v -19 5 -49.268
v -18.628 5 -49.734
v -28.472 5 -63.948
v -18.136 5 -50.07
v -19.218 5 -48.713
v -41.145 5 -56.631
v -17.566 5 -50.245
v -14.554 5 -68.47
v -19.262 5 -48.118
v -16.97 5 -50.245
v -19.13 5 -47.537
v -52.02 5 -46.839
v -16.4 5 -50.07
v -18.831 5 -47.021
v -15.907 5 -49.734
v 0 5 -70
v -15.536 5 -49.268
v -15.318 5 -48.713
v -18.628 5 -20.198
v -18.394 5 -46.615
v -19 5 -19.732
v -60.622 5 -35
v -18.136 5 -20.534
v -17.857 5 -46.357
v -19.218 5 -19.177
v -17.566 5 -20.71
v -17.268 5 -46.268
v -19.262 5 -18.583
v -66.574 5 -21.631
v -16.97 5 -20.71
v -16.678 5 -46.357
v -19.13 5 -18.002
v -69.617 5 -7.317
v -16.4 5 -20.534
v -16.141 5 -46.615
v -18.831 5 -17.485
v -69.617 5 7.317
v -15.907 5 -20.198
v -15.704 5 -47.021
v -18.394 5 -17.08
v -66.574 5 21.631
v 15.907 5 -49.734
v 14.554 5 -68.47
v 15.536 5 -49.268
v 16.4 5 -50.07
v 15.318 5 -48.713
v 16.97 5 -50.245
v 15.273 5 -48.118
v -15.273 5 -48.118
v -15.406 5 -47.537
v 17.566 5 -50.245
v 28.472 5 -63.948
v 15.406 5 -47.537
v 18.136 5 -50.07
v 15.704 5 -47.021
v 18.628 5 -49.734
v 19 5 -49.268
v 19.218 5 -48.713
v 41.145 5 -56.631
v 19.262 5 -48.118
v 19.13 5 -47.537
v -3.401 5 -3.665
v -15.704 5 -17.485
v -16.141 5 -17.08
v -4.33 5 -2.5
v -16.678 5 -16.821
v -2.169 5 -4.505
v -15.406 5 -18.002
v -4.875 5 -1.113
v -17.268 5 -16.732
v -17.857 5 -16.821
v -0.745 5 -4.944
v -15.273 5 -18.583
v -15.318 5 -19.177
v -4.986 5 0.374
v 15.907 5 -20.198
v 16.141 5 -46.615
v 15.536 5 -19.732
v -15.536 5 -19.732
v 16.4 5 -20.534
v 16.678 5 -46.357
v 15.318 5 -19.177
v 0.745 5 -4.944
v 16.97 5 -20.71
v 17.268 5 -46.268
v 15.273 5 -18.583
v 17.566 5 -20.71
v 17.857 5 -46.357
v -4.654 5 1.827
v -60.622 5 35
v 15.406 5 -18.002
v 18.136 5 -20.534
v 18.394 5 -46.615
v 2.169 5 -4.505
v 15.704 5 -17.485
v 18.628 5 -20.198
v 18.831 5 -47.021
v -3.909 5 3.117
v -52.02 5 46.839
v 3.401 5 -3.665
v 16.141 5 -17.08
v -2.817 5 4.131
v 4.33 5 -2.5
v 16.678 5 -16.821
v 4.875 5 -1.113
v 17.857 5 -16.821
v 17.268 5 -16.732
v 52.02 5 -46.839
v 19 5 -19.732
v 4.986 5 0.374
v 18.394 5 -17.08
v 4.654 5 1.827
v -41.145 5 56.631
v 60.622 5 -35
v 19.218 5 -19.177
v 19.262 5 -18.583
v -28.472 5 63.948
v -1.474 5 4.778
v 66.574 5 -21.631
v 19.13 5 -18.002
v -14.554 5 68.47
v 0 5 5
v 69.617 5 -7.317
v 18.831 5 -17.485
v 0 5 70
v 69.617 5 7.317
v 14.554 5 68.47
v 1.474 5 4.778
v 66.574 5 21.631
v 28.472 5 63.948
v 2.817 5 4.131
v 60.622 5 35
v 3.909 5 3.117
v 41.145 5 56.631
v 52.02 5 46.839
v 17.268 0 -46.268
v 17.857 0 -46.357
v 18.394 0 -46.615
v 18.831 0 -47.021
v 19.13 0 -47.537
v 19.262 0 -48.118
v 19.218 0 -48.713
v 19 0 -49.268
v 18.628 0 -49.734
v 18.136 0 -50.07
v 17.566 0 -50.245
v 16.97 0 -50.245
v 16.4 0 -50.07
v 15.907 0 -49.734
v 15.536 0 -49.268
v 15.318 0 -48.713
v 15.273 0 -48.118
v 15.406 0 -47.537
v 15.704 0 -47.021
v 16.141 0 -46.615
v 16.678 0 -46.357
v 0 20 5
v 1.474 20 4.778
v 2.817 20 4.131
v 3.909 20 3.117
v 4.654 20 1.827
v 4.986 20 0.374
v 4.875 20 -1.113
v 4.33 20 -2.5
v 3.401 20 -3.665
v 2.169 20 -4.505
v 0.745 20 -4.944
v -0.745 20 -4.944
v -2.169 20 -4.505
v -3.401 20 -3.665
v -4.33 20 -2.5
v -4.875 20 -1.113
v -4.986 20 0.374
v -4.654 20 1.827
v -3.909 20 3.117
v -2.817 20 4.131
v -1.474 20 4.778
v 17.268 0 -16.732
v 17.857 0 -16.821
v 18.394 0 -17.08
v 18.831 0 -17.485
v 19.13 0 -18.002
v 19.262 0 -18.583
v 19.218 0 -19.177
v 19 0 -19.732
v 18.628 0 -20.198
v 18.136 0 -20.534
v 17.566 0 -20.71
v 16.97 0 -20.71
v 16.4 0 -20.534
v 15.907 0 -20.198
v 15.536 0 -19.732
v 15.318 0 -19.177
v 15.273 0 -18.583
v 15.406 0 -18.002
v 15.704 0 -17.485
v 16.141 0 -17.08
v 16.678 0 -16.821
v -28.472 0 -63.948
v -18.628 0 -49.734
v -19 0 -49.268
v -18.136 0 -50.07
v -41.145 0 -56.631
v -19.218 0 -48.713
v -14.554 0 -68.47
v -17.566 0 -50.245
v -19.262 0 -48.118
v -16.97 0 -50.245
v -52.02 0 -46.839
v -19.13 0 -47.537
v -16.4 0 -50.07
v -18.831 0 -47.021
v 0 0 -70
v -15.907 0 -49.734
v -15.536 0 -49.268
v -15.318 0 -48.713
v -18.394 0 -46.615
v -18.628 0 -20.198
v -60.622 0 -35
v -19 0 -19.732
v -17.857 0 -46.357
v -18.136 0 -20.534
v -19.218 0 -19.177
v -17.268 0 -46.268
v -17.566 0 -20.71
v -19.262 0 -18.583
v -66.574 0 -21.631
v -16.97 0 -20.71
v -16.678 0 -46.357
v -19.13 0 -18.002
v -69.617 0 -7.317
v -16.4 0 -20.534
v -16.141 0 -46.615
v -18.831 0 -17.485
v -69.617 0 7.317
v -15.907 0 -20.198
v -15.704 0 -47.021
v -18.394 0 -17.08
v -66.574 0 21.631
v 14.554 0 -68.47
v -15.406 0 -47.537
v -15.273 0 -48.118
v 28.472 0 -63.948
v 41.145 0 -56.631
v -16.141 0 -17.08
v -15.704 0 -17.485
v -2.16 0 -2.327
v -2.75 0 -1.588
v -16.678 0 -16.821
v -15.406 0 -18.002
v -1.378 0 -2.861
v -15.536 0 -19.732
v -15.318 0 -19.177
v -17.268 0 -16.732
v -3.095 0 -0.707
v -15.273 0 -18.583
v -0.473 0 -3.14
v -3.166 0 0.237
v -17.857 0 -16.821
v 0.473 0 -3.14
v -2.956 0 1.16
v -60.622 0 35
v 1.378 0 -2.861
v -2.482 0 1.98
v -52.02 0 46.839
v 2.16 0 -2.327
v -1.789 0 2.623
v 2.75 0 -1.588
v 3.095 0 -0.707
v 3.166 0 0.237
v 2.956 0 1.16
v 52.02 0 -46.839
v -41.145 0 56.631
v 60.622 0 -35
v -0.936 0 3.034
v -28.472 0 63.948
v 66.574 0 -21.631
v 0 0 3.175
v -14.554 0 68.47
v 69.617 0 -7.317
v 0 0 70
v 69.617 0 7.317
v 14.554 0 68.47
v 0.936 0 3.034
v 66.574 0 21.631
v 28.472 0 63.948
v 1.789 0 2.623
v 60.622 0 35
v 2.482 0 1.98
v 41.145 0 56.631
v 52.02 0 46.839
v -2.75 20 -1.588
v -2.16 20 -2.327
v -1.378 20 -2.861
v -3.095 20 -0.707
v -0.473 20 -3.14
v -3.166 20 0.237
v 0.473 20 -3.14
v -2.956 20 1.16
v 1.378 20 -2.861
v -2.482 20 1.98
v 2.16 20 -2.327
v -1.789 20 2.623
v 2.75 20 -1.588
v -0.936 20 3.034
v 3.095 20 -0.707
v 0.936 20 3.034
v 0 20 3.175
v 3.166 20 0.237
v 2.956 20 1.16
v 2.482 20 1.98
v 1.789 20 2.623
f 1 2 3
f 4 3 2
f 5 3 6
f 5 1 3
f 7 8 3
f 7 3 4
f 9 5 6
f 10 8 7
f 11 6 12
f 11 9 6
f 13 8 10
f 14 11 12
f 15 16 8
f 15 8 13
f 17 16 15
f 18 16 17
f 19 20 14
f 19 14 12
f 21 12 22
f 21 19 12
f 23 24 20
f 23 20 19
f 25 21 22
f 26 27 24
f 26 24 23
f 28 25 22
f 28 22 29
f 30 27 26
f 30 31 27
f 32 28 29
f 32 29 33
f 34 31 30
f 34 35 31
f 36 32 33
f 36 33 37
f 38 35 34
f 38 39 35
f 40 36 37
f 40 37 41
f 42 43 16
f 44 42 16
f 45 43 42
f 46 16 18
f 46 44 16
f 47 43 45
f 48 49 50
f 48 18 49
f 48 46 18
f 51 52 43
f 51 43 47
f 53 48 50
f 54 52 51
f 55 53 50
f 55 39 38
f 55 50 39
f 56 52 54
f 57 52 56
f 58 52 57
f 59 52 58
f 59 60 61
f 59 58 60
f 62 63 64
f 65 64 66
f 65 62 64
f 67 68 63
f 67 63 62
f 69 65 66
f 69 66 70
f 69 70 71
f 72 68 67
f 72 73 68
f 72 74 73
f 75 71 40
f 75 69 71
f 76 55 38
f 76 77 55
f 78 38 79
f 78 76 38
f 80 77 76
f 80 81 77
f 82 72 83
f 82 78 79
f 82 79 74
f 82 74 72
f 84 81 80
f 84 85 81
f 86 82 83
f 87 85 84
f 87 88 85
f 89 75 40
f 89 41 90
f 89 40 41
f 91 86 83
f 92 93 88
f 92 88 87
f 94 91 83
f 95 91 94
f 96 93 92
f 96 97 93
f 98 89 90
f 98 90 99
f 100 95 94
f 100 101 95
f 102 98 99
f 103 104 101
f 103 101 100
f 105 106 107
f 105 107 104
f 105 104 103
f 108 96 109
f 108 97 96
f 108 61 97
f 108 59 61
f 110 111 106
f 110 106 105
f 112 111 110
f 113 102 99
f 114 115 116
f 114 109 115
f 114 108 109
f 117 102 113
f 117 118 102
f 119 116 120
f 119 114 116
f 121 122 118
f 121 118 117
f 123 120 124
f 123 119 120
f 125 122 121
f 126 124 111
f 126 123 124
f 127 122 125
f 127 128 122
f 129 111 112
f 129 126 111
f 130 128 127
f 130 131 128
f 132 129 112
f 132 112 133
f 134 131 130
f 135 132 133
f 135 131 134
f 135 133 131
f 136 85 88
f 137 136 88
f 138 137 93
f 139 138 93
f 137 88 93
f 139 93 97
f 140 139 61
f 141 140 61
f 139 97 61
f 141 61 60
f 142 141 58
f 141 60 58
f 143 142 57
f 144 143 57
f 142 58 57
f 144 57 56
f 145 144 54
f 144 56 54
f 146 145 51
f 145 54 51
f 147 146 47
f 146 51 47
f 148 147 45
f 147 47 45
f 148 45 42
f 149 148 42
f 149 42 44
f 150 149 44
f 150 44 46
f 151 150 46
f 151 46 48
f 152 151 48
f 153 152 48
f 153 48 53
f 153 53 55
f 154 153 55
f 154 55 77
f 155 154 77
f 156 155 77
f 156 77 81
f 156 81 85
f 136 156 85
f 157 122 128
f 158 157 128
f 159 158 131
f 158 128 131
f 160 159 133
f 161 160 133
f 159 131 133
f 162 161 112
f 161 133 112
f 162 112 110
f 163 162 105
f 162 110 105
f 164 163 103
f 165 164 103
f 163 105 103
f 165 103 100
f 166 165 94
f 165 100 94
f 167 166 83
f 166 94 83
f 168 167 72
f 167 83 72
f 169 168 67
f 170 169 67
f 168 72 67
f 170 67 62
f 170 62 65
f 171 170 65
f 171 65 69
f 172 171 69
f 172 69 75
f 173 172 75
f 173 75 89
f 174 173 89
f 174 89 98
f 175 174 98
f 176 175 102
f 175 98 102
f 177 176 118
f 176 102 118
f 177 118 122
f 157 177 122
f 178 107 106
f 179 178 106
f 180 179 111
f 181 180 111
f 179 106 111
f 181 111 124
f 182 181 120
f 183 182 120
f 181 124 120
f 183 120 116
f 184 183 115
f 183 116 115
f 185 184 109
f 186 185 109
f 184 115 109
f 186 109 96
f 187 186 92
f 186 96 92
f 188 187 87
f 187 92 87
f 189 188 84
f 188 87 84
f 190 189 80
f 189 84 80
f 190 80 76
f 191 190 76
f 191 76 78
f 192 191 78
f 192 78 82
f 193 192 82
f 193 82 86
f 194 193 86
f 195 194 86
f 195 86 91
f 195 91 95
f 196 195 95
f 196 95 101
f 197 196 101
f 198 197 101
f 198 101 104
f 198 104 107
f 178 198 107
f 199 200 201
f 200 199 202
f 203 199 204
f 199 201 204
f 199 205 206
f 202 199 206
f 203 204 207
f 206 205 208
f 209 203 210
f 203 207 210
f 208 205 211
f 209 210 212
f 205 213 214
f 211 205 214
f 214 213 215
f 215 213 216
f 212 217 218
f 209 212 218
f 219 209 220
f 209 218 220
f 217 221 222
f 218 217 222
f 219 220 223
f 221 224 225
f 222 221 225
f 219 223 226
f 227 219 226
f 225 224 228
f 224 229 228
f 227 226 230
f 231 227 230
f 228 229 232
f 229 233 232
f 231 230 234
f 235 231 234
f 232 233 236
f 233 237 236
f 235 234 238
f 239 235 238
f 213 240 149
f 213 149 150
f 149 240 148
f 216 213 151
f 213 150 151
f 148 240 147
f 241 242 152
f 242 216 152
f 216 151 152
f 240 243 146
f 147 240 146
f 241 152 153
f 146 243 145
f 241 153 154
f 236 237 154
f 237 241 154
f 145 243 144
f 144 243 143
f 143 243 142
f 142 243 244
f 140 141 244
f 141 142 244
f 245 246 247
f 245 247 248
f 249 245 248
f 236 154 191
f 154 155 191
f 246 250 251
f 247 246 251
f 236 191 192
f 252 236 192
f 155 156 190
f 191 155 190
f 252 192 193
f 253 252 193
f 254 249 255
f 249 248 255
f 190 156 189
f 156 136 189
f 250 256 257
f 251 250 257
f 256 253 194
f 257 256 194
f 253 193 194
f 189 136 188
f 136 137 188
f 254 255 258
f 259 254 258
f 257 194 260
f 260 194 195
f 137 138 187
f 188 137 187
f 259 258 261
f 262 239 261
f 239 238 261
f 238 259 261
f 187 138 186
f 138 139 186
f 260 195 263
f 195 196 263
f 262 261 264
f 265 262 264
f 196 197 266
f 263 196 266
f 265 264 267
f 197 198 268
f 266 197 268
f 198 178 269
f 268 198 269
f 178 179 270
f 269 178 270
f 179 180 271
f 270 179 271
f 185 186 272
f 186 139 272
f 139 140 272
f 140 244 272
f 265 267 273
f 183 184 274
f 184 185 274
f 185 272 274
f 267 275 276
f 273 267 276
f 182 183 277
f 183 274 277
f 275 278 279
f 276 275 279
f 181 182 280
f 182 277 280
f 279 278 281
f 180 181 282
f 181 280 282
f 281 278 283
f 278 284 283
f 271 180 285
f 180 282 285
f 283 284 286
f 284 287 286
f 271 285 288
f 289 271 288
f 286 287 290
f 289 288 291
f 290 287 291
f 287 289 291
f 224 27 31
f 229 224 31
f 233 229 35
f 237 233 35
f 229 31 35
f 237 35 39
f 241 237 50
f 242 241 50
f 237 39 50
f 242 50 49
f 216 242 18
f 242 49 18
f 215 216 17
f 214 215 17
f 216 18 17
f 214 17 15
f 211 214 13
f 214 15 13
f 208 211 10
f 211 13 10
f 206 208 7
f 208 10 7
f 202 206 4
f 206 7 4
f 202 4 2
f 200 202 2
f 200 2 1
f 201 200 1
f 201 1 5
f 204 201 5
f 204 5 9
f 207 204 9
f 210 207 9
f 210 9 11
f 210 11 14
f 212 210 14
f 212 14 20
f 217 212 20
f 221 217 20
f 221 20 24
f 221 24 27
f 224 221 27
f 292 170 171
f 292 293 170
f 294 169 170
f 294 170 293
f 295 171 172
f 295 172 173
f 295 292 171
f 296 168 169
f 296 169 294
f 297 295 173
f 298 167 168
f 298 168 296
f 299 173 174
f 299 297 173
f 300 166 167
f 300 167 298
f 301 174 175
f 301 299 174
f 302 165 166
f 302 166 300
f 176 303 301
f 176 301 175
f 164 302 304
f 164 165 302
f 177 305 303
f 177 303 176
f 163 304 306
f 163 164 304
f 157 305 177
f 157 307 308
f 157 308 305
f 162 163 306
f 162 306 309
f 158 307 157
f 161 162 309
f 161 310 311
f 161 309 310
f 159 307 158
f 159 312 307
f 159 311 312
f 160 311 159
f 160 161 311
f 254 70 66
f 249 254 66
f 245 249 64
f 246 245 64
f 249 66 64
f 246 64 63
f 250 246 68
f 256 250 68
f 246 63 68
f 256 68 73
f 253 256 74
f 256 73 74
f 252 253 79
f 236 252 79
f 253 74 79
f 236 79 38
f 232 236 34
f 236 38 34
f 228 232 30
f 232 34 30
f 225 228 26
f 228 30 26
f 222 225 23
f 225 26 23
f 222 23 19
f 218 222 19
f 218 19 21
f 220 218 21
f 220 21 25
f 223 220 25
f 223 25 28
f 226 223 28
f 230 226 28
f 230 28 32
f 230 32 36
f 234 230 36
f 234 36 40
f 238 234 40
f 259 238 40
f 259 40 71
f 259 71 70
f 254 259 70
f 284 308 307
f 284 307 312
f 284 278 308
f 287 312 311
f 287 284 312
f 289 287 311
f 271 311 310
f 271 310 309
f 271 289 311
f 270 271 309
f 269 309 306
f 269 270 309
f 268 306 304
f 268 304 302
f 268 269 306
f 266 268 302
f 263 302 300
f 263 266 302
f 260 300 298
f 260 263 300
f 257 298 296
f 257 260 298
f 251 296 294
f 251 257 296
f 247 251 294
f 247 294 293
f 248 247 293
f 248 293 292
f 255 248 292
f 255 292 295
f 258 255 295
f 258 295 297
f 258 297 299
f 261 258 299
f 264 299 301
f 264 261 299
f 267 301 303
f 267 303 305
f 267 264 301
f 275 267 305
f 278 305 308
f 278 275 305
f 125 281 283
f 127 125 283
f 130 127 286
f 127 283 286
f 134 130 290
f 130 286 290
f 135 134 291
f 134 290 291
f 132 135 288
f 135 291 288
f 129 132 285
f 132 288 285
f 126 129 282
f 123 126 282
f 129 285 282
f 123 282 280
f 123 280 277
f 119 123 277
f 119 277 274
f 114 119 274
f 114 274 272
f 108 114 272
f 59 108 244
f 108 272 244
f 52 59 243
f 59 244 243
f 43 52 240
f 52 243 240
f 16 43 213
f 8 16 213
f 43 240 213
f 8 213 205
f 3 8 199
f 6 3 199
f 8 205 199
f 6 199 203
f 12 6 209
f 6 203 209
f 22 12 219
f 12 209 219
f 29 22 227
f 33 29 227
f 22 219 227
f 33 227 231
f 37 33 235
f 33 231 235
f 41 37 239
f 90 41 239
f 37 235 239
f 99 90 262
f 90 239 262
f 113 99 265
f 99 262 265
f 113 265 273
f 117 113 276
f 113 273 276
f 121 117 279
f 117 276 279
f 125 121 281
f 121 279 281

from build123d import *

# Parameters (mm, degrees)
SKETCH1_R           = 70
SKETCH1_R_2         = 3.175
BOSS_EXTRUDE2_DEPTH = 5
SKETCH2_R           = 5
SKETCH2_R_2         = 3.175
BOSS_EXTRUDE4_DEPTH = 15
SKETCH3_R           = 2
CUT_EXTRUDE1_DEPTH  = 10


with BuildPart() as part:
    # Sketch1 → Boss-Extrude2 (new body)
    with BuildSketch(Plane(origin=(0, 0, 0), x_dir=(1, 0, 0), z_dir=(0, 1, 0))):
        with Locations(Location((0, 0, 0), (0, 0, 270))):
            Circle(SKETCH1_R)
        with Locations(Location((0, 0, 0), (0, 0, 270))):
            Circle(SKETCH1_R_2, mode=Mode.SUBTRACT)
    extrude(amount=BOSS_EXTRUDE2_DEPTH)

    # Sketch2 → Boss-Extrude4 (add)
    with BuildSketch(Plane(origin=(0, 5, 0), x_dir=(1, 0, 0), z_dir=(0, 1, 0))):
        with Locations(Location((0, 0, 0), (0, 0, 270))):
            Circle(SKETCH2_R)
        with Locations(Location((0, 0, 0), (0, 0, 270))):
            Circle(SKETCH2_R_2, mode=Mode.SUBTRACT)
    extrude(amount=BOSS_EXTRUDE4_DEPTH)

    # Sketch3 → Cut-Extrude1 (cut)
    with BuildSketch(Plane(origin=(0, 5, 0), x_dir=(1, 0, 0), z_dir=(0, 1, 0))):
        with Locations(Location((-17.267766953, 48.267766953, 0), (0, 0, 270))):
            Circle(SKETCH3_R)
        with Locations(Location((17.267766953, 48.267766953, 0), (0, 0, 270))):
            Circle(SKETCH3_R)
        with Locations(Location((-17.267766953, 18.732233047, 0), (0, 0, 270))):
            Circle(SKETCH3_R)
        with Locations(Location((17.267766953, 18.732233047, 0), (0, 0, 270))):
            Circle(SKETCH3_R)
    extrude(amount=-CUT_EXTRUDE1_DEPTH, mode=Mode.SUBTRACT)


solid = part.part
